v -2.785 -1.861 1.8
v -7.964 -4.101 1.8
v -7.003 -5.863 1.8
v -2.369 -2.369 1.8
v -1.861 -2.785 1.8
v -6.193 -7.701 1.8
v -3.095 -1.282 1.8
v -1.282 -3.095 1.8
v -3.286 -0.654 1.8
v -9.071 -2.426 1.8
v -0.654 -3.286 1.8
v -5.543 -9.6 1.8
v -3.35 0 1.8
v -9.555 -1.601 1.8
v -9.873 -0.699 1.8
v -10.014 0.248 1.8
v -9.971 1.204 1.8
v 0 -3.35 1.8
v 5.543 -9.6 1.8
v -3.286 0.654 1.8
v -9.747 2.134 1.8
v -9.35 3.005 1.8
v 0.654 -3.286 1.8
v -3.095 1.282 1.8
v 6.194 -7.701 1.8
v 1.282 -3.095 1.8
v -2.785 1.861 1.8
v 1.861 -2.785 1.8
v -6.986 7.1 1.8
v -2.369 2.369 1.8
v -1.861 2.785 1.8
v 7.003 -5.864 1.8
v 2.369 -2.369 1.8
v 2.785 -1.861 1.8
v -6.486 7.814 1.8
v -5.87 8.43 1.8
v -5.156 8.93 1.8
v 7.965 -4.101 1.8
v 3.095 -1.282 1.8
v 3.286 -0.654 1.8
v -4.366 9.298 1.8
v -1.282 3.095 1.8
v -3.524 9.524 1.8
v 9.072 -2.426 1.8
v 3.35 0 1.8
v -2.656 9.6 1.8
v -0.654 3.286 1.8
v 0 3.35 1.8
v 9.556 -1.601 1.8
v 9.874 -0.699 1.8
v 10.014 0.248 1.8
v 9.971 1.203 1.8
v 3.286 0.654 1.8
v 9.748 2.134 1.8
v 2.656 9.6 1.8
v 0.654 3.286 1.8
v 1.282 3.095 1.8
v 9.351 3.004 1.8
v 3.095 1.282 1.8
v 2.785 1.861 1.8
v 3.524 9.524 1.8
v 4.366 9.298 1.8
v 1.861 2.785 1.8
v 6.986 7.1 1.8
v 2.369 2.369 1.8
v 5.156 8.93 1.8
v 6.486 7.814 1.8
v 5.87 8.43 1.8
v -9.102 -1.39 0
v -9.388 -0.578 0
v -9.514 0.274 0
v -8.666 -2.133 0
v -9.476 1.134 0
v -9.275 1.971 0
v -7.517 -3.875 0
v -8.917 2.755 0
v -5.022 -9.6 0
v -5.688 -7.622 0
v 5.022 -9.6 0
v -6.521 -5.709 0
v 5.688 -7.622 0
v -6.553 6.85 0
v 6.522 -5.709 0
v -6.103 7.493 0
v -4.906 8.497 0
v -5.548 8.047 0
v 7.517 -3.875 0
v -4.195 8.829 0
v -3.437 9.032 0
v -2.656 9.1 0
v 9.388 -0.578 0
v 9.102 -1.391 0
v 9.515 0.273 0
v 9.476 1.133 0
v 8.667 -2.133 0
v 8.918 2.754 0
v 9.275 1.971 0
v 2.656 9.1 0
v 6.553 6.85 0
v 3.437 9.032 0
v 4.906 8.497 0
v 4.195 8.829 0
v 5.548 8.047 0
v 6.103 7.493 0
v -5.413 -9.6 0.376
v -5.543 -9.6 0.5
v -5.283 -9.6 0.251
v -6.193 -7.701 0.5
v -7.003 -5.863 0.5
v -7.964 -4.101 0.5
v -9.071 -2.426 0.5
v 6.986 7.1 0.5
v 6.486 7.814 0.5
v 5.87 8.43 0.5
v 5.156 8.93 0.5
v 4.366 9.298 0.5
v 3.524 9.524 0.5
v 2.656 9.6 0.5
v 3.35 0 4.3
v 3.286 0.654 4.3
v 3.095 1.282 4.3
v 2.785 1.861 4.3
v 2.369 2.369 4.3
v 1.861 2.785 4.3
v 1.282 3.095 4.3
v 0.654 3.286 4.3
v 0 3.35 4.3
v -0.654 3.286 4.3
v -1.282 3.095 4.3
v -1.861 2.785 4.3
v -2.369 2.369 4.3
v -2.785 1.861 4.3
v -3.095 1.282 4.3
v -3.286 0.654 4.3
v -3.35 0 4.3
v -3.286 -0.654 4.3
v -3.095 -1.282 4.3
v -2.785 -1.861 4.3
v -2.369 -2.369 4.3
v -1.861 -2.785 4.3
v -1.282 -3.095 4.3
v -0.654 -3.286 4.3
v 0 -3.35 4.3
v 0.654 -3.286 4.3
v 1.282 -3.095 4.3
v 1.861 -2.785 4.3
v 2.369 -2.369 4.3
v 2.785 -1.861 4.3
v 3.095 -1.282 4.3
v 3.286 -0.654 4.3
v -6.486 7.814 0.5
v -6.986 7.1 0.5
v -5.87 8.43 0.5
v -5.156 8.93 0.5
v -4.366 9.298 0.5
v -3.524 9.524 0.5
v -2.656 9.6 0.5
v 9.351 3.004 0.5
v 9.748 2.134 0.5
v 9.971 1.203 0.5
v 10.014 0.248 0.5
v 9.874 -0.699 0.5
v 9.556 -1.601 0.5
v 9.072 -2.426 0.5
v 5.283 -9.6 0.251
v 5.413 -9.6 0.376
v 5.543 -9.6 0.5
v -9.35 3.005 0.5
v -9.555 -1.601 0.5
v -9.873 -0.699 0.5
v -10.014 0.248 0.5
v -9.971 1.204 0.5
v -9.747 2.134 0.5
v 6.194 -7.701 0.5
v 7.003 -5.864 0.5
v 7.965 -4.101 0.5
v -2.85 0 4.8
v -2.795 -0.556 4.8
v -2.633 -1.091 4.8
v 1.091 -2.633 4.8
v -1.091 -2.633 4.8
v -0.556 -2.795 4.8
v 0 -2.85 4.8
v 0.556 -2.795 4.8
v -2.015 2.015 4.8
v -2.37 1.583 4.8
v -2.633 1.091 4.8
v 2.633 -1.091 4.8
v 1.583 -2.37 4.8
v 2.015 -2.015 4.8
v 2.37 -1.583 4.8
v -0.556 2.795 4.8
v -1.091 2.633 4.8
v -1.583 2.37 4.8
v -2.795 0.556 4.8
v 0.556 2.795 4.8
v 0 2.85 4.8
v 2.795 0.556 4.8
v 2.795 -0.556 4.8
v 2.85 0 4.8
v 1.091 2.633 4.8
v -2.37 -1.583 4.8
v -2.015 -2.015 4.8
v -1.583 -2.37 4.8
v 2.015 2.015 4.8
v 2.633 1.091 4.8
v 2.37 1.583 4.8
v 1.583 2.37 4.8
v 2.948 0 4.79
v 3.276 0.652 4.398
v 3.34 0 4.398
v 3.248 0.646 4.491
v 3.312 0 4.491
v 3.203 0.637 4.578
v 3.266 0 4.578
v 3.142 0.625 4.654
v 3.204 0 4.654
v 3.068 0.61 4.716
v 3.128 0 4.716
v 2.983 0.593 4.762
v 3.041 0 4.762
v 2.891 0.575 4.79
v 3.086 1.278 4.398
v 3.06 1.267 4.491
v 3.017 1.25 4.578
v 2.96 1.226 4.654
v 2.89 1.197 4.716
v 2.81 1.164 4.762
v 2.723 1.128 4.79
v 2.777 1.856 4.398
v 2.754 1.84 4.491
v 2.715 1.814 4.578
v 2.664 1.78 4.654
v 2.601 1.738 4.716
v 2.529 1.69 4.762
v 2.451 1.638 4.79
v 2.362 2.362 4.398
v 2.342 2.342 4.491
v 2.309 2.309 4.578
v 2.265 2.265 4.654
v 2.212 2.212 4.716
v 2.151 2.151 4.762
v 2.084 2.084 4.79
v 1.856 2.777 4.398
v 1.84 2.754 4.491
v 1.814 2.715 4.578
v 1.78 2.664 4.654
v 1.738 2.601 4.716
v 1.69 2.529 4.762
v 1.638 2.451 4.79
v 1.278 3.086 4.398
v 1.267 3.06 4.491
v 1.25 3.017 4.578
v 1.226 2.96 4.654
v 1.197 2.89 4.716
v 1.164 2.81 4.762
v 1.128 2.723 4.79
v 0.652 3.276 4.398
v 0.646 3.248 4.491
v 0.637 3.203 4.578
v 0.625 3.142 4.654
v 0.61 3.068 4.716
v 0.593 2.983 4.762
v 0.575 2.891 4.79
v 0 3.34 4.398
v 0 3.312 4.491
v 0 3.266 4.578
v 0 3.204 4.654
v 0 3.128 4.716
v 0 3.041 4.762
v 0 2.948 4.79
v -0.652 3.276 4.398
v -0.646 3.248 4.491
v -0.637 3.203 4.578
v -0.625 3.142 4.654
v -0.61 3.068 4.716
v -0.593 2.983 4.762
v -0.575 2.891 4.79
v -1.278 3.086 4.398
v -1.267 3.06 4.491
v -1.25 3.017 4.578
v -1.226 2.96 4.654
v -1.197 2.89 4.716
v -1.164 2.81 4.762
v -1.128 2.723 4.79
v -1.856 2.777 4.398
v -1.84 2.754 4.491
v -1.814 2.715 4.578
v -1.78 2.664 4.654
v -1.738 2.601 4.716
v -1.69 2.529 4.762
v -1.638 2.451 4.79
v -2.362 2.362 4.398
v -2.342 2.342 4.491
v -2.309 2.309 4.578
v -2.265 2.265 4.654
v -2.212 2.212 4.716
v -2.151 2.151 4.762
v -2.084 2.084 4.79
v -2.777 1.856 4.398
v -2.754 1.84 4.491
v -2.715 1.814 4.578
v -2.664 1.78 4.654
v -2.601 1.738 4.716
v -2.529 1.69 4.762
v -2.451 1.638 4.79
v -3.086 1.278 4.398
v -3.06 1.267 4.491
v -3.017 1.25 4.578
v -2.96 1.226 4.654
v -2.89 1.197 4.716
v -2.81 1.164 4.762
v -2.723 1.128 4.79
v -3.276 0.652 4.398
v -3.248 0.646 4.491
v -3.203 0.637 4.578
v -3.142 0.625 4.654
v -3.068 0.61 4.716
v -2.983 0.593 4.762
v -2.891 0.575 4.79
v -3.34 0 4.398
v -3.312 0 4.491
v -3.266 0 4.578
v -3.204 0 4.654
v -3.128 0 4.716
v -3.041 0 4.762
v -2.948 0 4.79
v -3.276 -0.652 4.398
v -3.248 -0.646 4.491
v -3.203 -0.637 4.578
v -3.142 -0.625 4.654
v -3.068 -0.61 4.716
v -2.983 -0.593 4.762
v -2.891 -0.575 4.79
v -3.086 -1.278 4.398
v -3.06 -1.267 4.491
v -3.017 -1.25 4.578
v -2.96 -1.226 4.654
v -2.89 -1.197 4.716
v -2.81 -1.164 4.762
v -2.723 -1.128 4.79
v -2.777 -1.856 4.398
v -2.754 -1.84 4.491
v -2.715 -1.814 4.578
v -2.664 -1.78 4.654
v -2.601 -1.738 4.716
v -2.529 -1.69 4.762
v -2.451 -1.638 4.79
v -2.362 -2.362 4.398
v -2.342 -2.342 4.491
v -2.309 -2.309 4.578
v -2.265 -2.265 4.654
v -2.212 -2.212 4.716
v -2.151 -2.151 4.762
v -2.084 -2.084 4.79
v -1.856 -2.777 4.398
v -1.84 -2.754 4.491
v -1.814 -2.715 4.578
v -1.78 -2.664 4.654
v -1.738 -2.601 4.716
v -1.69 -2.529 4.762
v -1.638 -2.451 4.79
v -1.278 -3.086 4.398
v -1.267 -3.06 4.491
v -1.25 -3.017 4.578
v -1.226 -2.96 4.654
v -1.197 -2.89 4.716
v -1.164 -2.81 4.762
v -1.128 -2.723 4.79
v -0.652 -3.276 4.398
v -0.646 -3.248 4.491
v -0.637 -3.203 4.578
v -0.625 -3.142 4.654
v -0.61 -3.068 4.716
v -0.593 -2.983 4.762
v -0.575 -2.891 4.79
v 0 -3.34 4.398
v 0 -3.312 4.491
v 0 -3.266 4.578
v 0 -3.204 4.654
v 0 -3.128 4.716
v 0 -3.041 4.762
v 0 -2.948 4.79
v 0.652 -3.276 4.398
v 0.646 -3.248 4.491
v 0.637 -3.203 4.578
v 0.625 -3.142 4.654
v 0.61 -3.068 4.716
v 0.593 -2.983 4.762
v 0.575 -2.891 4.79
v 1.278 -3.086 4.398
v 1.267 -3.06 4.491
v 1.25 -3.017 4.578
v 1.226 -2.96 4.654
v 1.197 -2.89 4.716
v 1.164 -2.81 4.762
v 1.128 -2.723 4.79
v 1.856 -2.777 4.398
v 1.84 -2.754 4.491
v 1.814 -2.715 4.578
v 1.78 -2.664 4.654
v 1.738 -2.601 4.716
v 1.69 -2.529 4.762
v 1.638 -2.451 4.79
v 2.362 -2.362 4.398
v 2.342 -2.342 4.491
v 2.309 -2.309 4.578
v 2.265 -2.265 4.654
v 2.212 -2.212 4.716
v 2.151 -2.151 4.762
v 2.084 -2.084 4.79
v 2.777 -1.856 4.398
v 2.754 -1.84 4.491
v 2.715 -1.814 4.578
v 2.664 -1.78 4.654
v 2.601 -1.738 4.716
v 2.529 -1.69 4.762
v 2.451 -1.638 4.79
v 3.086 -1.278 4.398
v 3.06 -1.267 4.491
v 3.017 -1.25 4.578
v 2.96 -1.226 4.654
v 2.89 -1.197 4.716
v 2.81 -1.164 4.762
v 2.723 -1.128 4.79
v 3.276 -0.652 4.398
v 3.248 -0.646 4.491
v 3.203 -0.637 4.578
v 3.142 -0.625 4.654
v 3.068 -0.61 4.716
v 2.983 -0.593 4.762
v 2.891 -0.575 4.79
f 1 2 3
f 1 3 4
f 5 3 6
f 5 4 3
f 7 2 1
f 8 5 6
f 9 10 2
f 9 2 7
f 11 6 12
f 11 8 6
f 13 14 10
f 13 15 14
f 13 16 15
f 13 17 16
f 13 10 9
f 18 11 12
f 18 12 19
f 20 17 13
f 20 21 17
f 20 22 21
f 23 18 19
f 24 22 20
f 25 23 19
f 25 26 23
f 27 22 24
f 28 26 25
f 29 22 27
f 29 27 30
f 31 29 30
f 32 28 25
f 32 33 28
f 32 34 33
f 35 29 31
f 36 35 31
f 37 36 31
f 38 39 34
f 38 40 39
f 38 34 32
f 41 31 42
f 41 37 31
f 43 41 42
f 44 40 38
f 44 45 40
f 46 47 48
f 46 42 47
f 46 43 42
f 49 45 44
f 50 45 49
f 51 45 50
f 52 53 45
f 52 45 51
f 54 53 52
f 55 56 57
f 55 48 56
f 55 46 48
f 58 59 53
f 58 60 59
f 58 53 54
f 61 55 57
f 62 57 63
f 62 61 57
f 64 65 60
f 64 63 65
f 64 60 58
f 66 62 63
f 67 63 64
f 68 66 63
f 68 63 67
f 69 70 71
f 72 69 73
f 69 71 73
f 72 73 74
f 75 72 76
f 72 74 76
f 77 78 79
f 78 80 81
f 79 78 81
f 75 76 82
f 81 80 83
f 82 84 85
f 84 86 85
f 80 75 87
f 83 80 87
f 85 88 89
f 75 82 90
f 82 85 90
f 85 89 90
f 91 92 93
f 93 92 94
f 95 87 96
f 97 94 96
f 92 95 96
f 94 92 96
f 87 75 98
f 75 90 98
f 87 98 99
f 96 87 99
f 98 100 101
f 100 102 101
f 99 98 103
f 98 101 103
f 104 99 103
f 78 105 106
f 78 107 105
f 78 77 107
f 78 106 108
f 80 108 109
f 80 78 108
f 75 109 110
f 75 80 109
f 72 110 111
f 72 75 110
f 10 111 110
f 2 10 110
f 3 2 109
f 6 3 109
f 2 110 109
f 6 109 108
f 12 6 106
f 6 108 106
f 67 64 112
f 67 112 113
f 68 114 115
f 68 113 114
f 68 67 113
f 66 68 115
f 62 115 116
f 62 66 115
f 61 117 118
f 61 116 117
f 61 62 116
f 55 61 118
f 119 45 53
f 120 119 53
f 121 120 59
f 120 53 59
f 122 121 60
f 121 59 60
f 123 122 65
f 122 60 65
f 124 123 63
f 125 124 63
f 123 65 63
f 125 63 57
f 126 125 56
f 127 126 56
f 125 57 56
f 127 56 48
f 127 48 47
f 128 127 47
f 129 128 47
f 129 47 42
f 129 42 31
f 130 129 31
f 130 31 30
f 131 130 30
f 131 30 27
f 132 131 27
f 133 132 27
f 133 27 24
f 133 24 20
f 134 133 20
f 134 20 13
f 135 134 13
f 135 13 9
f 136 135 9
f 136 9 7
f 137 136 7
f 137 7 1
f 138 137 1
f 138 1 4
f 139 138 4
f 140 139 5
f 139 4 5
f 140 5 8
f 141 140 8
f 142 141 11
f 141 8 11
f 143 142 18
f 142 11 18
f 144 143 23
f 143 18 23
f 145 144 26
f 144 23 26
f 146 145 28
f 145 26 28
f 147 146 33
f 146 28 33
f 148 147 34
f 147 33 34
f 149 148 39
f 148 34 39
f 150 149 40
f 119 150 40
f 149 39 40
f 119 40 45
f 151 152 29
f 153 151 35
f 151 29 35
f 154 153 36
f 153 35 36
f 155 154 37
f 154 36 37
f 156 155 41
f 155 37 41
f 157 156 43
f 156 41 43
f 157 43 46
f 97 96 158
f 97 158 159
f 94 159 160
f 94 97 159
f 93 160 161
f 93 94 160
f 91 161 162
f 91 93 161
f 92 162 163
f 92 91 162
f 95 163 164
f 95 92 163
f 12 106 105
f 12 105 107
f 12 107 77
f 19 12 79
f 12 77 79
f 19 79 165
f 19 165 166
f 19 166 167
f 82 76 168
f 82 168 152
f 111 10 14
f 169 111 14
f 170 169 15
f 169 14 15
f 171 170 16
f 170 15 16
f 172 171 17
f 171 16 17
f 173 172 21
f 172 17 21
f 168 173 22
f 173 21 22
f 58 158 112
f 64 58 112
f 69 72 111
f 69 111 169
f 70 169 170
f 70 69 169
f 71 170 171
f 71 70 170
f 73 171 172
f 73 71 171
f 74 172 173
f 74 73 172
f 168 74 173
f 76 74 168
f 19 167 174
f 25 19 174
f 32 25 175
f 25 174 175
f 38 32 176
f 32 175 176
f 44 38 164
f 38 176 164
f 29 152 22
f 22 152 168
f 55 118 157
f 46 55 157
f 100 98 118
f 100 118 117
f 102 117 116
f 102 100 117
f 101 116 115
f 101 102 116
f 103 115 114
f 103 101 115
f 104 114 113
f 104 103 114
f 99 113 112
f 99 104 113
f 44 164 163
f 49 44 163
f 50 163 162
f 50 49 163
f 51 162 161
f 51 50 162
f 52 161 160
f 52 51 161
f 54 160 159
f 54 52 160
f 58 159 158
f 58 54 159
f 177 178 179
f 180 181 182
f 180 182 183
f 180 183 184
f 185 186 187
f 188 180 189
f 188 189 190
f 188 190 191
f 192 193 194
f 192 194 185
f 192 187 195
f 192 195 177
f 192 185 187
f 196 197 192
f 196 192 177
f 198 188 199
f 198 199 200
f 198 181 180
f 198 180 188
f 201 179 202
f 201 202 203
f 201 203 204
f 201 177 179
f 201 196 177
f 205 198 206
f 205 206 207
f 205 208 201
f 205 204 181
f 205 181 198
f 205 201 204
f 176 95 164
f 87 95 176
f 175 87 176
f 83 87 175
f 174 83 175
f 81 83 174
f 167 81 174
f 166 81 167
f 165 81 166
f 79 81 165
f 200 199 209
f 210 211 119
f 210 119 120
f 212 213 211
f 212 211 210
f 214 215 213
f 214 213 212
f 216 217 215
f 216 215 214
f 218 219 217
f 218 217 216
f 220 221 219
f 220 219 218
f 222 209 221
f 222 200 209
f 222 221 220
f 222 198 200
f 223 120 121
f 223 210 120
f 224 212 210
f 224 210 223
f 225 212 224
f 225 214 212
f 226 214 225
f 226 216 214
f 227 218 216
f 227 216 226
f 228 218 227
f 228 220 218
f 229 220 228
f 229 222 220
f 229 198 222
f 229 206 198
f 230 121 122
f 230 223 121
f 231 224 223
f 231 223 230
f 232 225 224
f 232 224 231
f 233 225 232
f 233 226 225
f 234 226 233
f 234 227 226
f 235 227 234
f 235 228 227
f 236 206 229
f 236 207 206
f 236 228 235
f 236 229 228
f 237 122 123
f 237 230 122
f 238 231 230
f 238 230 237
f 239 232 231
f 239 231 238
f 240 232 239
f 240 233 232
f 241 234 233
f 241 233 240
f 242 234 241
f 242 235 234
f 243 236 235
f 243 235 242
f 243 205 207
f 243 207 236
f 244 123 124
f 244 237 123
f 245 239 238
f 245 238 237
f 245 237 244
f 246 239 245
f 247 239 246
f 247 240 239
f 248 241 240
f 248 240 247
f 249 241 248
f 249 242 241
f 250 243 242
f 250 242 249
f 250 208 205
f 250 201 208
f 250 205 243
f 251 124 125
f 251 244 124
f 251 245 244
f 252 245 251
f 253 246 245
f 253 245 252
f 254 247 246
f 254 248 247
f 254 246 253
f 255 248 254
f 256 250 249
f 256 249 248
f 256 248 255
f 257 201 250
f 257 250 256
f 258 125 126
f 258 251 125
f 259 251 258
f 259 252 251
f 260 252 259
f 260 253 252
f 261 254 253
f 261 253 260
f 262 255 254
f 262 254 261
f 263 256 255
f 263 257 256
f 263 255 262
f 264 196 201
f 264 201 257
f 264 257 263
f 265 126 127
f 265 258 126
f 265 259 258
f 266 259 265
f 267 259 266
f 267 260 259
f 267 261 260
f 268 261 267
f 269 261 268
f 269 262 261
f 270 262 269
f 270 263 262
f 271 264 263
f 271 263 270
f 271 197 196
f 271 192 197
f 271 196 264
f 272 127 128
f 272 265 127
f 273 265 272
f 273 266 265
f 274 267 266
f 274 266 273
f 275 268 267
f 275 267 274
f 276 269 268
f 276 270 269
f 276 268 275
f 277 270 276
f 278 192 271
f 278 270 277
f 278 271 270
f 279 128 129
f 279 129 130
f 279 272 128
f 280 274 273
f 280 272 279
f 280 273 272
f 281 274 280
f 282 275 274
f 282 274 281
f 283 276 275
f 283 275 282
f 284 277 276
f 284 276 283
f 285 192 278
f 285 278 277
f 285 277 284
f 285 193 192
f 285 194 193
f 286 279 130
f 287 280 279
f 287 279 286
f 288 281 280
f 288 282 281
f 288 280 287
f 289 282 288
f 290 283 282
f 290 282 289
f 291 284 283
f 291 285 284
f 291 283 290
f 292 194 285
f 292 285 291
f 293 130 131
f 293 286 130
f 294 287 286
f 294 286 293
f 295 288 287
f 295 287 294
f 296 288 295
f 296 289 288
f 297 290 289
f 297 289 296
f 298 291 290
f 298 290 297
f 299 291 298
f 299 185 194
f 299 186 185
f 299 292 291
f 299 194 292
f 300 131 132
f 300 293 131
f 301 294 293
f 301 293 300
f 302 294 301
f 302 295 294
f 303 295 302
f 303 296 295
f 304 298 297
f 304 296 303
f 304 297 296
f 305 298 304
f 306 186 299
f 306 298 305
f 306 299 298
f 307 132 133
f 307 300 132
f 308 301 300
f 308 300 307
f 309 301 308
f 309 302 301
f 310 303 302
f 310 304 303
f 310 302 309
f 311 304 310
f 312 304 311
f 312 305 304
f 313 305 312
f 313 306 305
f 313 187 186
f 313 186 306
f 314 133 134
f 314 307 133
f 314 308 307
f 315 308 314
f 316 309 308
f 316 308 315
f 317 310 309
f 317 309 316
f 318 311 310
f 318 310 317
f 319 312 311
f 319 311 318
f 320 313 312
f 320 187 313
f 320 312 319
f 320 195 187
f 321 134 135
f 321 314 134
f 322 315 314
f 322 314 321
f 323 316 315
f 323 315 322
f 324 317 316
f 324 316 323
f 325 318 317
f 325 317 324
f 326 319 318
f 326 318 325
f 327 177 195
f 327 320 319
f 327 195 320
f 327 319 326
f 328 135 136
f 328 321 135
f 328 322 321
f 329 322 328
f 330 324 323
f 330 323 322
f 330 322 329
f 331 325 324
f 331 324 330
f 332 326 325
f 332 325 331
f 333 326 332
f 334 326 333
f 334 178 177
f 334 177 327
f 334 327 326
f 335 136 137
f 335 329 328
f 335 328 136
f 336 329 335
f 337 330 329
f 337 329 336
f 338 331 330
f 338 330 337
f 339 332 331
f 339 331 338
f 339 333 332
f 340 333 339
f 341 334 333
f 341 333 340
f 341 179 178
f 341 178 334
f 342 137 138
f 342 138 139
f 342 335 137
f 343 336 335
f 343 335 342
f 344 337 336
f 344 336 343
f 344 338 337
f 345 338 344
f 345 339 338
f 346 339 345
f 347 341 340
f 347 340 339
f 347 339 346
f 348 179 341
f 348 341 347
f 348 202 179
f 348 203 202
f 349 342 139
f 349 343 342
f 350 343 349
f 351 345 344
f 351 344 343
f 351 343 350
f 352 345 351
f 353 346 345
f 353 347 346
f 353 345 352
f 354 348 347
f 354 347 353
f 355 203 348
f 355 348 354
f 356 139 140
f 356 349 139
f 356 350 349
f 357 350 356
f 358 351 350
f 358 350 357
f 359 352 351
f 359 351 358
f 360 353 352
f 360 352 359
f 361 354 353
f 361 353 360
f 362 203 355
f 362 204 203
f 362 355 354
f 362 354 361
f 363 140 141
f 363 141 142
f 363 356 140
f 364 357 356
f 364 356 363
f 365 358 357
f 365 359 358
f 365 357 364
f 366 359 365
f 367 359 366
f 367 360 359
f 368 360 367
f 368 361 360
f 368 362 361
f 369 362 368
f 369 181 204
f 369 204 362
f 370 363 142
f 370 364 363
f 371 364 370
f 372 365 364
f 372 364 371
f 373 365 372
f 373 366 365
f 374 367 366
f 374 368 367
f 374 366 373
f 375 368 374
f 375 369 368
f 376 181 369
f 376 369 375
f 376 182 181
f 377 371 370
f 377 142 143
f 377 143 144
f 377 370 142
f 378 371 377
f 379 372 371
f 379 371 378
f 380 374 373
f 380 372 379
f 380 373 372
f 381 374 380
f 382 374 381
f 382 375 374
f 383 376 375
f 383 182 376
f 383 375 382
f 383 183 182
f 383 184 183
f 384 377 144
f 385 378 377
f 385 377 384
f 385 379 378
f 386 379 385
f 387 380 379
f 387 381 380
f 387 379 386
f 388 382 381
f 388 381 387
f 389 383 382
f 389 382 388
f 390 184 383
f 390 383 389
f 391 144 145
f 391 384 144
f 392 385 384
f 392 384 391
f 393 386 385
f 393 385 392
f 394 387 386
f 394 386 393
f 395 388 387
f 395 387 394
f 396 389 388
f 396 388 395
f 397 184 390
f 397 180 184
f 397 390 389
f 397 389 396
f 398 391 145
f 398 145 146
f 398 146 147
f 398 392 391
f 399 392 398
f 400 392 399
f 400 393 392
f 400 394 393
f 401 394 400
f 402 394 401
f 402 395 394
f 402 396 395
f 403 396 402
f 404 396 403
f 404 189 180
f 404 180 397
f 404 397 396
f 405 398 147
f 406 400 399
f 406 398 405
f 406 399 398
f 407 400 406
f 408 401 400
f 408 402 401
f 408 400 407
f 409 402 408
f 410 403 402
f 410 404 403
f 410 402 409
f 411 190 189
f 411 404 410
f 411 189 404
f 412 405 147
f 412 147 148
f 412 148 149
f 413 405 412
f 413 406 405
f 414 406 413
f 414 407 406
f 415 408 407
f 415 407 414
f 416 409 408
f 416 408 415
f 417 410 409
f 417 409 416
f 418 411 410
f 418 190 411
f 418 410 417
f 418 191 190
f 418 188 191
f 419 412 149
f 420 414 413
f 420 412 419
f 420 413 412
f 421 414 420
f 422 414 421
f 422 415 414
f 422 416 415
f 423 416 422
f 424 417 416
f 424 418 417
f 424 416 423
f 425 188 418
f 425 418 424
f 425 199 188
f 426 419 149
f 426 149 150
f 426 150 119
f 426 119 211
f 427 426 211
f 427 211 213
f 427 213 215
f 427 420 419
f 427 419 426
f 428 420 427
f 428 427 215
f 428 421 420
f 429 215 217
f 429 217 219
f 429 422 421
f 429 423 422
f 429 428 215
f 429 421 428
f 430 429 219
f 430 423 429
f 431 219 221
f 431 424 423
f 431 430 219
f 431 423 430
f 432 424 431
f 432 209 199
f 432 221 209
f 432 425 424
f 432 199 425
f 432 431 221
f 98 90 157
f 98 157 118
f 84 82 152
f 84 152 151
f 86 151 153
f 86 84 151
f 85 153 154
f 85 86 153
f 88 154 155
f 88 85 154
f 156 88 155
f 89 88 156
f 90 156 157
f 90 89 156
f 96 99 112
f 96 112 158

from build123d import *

# Parameters (mm, degrees)
F0_R     = 3.35
F1_DEPTH = 1.8
F2_R     = 5
F3_DEPTH = 4.8
F4_R     = 0.5
F5_SIZE  = 0.5


with BuildPart() as f1:
    # F0 (on Top) → F1 (new body)
    with BuildSketch(Plane.XY):
        with BuildLine():
            Line((-5.5425625842, -9.6), (5.5425625842, -9.6))
            ThreePointArc((5.5425625842, -9.6), (7.7462161651, -4.4722799881), (11.0851251684, 0))
            Line((11.0851251684, 0), (5.5425625842, 9.6))
            Line((5.5425625842, 9.6), (-5.5425625842, 9.6))
            Line((-5.5425625842, 9.6), (-11.0851251684, 0))
            ThreePointArc((-11.0851251684, 0), (-7.745470711, -4.4718496), (-5.5425625842, -9.6))
        make_face()
        Polygon((7.3900834456, 0), (3.6950417228, -6.4), (-3.6950417228, -6.4), (-7.3900834456, 0), (-3.6950417228, 6.4), (3.6950417228, 6.4), align=None, mode=Mode.SUBTRACT)
        Polygon((-3.6950417228, -6.4), (3.6950417228, -6.4), (7.3900834456, 0), (3.6950417228, 6.4), (-3.6950417228, 6.4), (-7.3900834456, 0), align=None)
        Circle(F0_R, mode=Mode.SUBTRACT)
    extrude(amount=F1_DEPTH)

    # F2
    f2_edges = [f1.edges().sort_by_distance(p)[0] for p in [
        (-11.085125, 0, 0.9),
        (-5.542563, 9.6, 0.9),
        (5.542563, 9.6, 0.9),
        (11.085125, 0, 0.9),
    ]]
    fillet(f2_edges, radius=F2_R)

    # F0 (on Top) → F3 (join)
    with BuildSketch(Plane.XY):
        Circle(F0_R)
    extrude(amount=F3_DEPTH)

    # F4
    f4_edges = [f1.edges().sort_by_distance(p)[0] for p in [
        (-3.35, 0, 4.8),
    ]]
    fillet(f4_edges, radius=F4_R)

    # F5
    f5_edges = [f1.edges().sort_by_distance(p)[0] for p in [
        (-5.155811, 8.930127, 0),
    ]]
    chamfer(f5_edges, length=F5_SIZE)


solid = f1.part
